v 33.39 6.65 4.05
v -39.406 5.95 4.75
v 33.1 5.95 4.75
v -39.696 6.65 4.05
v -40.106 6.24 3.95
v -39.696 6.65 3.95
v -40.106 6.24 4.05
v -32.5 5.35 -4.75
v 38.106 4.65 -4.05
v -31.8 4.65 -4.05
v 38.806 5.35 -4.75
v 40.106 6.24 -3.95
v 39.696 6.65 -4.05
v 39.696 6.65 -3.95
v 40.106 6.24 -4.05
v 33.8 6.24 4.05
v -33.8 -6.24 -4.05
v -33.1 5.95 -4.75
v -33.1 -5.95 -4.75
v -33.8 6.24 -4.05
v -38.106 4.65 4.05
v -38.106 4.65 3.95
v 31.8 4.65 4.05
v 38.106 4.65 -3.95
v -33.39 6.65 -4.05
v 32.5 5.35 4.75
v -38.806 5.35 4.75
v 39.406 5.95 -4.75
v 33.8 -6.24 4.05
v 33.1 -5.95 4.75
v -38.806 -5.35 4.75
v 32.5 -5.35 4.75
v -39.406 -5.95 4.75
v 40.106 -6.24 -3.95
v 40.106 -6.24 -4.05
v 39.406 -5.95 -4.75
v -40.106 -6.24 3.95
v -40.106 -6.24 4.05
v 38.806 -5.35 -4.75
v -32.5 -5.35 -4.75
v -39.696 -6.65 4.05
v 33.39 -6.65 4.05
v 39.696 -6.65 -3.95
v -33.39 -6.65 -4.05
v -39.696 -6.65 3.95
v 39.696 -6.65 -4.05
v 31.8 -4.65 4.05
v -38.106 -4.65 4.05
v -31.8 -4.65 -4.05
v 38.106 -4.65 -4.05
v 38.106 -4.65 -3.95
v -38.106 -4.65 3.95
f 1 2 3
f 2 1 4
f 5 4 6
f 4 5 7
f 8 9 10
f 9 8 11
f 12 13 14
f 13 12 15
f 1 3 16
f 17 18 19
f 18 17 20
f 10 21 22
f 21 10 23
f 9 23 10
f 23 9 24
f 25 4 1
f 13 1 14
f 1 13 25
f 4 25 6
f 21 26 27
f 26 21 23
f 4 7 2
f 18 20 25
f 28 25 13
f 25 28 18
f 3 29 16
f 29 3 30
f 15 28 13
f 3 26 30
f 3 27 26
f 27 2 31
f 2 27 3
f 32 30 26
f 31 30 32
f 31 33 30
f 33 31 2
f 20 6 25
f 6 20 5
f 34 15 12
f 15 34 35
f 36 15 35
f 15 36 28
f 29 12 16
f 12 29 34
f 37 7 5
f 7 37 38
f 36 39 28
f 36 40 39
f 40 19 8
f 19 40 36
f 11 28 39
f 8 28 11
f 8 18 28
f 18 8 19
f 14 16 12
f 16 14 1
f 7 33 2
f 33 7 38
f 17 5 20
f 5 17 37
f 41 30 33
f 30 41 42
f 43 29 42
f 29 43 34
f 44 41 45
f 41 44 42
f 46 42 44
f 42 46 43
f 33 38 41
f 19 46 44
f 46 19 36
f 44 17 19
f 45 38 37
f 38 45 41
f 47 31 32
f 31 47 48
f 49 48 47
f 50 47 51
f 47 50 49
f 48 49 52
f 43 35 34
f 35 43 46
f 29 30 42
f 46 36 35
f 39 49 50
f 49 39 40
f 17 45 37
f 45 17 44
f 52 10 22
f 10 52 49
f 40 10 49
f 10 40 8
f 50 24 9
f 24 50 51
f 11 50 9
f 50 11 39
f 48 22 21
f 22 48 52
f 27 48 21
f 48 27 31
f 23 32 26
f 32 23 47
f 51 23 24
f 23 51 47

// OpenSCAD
// Title: Micro Wallet
// Author: http://www.thingiverse.com/Jinja
// Date: 14/9/2013

/////////// START OF PARAMETERS /////////////////

// The more cards you carry, the bigger this should be. This is the only thing you really need to change.
inner_thickness = 10;

// Percentage to increase wall thickness
increase_wall = 0; // [0:100]

// The inner width. This is the width of the clip in the unlocked position.
inner_width = 65; // [60:80]

// The height of the wallet
height = 8; //[6:30]

// The width of your credit cards. You only need to change this if you plan to use the holder for something other than credit cards.
card_width = 56;

/////////// END OF PARAMETERS /////////////////
rounded = 0.7*1;
overhang=45*1;

$fs=0.3*1;
//$fa=5*1; //smooth
$fa=8*1; //nearly smooth
//$fa=20*1; //rough

x = inner_width*1;
y = height*1;
r = sqrt((x*x)+(y*y));
cc = card_width*1;
a = asin(cc/r);
b = acos(x/r);
c = (a-b);
new_length = cc/sin(c);
additional = new_length-x;

wall_thickness2 = 2 * (1+(increase_wall/100));
wall_thickness = wall_thickness2-(2*rounded);
height2 = height-wall_thickness2;

minkowski()
{
difference()
{
	wedge( additional+new_length+2*wall_thickness, new_length+2*wall_thickness, (inner_thickness+rounded)+2*wall_thickness, height );

	wedge( additional+new_length, new_length, (inner_thickness+rounded), height );
}

diamond(rounded);
}

module wedge( length, length2, thickness, height )
{
	hull()
	{
		translate([(-length+length2)*0.5,0,height*0.5])
		cube( [length2, thickness, 0.1], true );

		translate([(length-length2)*0.5,0,-height*0.5])
		cube( [length2, thickness, 0.1], true );
	}
}



module bar( length, diam1, diam2, height )
{
	hull()
	{
		translate( [-length*0.5, 0, -height*0.5] )
		cylinder( height, diam1*0.5, diam2*0.5 );
		translate( [length*0.5, 0, -height*0.5] )
		cylinder( height, diam1*0.5, diam2*0.5 );
	}
}

module cutter(dist, overhang)
{
	size = dist*2;

	translate([dist,-dist,-dist])
	cube([size,size,size]);

	translate([-dist-size,-dist,-dist])
	cube([size,size,size]);

	translate([dist,-dist,0])
	rotate([0,-overhang,0])
	cube([size,size,size]);

	translate([-dist,-dist,0])
	rotate([0,-90+overhang,0])
	cube([size,size,size]);

	translate([dist,-dist,0])
	rotate([0,90+overhang,0])
	cube([size,size,size]);

	translate([-dist,-dist,0])
	rotate([0,180-overhang,0])
	cube([size,size,size]);

}

module diamond( rounded )
{
	dist = rounded;
	difference()
	{
		cube([2*rounded,2*rounded,2*rounded], true);
		for(i=[0:45:179])
		{
			rotate([0,0,i])
			cutter(dist, overhang);
		}
	}
}
